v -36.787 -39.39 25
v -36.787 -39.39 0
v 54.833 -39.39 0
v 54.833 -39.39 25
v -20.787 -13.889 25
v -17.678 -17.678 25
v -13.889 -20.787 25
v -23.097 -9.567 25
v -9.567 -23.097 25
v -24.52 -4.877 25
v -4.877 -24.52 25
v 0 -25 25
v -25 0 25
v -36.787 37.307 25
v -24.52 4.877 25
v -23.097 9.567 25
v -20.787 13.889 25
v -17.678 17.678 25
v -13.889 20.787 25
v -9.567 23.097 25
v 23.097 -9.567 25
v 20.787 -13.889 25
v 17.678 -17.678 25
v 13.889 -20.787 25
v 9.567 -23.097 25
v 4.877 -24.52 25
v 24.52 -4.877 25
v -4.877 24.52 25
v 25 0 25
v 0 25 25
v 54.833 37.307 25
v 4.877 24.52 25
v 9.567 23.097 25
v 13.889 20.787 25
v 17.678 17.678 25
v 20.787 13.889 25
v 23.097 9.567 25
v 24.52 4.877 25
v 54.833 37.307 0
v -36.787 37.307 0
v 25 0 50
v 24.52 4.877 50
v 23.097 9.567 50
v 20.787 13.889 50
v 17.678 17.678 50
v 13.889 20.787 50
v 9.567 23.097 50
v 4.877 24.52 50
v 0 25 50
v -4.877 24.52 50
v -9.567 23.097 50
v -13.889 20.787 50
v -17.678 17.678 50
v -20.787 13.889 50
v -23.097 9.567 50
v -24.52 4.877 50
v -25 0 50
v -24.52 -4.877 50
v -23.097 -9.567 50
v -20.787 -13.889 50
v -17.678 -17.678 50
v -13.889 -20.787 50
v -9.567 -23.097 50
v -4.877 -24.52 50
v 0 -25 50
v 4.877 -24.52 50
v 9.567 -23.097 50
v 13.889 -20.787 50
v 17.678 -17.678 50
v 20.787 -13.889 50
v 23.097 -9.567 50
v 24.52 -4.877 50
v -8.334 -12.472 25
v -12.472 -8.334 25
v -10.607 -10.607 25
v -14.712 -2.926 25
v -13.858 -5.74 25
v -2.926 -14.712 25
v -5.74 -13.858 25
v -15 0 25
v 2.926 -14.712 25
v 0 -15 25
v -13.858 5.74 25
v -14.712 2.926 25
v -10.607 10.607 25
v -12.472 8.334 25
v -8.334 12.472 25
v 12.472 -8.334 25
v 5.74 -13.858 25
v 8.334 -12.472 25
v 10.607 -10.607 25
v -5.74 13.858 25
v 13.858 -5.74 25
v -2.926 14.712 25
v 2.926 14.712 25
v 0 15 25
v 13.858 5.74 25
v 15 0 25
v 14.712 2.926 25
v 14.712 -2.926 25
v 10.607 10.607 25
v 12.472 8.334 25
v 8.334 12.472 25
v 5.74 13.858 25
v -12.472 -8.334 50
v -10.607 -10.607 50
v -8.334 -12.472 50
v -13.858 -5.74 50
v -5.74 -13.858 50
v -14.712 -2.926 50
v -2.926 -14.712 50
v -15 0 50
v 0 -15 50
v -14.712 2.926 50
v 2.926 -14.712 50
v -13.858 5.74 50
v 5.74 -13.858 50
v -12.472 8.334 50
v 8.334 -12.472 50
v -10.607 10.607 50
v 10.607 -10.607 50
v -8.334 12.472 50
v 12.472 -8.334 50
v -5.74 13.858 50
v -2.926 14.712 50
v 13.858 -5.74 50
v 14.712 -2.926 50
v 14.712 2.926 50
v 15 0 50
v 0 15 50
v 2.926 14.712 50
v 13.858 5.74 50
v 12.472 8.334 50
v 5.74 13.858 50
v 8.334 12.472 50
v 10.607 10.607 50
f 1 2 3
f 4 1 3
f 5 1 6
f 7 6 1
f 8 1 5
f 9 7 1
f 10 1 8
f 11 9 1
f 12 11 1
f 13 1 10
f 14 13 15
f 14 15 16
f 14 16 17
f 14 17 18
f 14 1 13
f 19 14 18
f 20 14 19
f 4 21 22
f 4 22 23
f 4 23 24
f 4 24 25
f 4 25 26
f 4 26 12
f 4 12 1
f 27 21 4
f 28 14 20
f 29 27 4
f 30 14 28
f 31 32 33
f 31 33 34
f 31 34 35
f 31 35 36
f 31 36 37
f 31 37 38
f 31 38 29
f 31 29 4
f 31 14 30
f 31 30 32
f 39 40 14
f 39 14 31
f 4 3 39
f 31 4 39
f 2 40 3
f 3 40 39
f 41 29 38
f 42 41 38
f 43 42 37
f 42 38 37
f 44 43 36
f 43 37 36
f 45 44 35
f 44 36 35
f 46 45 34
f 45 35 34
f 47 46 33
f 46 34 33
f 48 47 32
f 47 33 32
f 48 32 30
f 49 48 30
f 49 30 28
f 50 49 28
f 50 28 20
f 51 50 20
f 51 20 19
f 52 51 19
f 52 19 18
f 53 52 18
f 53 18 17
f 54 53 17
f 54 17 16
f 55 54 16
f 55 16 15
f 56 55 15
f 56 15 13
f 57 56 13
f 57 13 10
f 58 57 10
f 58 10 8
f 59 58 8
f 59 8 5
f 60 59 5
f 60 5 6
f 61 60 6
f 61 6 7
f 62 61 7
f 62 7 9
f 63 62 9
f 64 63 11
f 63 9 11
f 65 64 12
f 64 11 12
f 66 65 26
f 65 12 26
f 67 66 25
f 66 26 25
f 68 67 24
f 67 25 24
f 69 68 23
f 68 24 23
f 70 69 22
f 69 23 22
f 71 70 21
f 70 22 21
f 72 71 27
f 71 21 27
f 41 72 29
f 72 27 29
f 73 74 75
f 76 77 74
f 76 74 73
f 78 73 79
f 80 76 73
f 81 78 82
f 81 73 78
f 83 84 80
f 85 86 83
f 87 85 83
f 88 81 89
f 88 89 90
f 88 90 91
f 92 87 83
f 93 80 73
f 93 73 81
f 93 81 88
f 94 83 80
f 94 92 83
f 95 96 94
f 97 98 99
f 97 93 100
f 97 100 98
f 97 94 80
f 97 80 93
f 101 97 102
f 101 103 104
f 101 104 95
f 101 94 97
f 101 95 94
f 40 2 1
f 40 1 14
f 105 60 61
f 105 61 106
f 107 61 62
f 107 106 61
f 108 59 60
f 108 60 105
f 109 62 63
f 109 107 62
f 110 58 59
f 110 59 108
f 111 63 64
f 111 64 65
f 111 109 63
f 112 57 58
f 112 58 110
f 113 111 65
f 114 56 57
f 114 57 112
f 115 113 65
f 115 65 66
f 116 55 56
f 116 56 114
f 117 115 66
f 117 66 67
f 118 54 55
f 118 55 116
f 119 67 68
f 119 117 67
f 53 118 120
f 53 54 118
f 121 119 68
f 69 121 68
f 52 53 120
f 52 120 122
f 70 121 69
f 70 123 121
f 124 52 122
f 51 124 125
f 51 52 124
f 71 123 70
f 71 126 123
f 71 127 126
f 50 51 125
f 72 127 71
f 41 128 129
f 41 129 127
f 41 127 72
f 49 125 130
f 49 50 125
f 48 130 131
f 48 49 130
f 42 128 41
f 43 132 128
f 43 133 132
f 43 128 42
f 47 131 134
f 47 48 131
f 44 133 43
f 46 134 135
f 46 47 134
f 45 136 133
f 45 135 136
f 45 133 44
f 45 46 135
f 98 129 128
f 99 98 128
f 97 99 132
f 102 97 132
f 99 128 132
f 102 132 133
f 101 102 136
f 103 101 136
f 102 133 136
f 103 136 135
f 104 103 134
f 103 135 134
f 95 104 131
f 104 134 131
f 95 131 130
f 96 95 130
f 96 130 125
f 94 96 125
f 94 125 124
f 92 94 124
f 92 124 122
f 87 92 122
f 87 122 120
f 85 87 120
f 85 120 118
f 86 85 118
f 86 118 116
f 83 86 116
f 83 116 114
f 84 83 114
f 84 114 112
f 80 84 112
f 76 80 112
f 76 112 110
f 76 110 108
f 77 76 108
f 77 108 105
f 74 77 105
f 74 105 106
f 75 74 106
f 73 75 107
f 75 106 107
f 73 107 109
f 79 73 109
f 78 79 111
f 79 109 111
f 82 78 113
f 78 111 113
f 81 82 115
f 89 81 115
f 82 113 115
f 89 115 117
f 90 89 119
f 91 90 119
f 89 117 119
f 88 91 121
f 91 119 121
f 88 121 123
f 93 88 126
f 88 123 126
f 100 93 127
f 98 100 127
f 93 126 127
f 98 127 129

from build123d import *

# Parameters (mm, degrees)
F0_R     = 25
F1_DEPTH = 50
F2_R     = 15
F3_DEPTH = 50.001
F4_W     = 91.62021
F4_H     = 76.697219
F5_DEPTH = 25


with BuildPart() as f1:
    # F0 (on Top) → F1 (new body)
    with BuildSketch(Plane.XY):
        Circle(F0_R)
    extrude(amount=F1_DEPTH)

    # F2 (on face) → F3 (cut, through all)
    with BuildSketch(Plane.XY.offset(50)):
        Circle(F2_R)
    extrude(amount=-F3_DEPTH, mode=Mode.SUBTRACT)

    # F4 (on Top) → F5 (join)
    with BuildSketch(Plane.XY):
        with Locations((9.023199, -1.041138)):
            Rectangle(F4_W, F4_H)
    extrude(amount=F5_DEPTH)


solid = f1.part
